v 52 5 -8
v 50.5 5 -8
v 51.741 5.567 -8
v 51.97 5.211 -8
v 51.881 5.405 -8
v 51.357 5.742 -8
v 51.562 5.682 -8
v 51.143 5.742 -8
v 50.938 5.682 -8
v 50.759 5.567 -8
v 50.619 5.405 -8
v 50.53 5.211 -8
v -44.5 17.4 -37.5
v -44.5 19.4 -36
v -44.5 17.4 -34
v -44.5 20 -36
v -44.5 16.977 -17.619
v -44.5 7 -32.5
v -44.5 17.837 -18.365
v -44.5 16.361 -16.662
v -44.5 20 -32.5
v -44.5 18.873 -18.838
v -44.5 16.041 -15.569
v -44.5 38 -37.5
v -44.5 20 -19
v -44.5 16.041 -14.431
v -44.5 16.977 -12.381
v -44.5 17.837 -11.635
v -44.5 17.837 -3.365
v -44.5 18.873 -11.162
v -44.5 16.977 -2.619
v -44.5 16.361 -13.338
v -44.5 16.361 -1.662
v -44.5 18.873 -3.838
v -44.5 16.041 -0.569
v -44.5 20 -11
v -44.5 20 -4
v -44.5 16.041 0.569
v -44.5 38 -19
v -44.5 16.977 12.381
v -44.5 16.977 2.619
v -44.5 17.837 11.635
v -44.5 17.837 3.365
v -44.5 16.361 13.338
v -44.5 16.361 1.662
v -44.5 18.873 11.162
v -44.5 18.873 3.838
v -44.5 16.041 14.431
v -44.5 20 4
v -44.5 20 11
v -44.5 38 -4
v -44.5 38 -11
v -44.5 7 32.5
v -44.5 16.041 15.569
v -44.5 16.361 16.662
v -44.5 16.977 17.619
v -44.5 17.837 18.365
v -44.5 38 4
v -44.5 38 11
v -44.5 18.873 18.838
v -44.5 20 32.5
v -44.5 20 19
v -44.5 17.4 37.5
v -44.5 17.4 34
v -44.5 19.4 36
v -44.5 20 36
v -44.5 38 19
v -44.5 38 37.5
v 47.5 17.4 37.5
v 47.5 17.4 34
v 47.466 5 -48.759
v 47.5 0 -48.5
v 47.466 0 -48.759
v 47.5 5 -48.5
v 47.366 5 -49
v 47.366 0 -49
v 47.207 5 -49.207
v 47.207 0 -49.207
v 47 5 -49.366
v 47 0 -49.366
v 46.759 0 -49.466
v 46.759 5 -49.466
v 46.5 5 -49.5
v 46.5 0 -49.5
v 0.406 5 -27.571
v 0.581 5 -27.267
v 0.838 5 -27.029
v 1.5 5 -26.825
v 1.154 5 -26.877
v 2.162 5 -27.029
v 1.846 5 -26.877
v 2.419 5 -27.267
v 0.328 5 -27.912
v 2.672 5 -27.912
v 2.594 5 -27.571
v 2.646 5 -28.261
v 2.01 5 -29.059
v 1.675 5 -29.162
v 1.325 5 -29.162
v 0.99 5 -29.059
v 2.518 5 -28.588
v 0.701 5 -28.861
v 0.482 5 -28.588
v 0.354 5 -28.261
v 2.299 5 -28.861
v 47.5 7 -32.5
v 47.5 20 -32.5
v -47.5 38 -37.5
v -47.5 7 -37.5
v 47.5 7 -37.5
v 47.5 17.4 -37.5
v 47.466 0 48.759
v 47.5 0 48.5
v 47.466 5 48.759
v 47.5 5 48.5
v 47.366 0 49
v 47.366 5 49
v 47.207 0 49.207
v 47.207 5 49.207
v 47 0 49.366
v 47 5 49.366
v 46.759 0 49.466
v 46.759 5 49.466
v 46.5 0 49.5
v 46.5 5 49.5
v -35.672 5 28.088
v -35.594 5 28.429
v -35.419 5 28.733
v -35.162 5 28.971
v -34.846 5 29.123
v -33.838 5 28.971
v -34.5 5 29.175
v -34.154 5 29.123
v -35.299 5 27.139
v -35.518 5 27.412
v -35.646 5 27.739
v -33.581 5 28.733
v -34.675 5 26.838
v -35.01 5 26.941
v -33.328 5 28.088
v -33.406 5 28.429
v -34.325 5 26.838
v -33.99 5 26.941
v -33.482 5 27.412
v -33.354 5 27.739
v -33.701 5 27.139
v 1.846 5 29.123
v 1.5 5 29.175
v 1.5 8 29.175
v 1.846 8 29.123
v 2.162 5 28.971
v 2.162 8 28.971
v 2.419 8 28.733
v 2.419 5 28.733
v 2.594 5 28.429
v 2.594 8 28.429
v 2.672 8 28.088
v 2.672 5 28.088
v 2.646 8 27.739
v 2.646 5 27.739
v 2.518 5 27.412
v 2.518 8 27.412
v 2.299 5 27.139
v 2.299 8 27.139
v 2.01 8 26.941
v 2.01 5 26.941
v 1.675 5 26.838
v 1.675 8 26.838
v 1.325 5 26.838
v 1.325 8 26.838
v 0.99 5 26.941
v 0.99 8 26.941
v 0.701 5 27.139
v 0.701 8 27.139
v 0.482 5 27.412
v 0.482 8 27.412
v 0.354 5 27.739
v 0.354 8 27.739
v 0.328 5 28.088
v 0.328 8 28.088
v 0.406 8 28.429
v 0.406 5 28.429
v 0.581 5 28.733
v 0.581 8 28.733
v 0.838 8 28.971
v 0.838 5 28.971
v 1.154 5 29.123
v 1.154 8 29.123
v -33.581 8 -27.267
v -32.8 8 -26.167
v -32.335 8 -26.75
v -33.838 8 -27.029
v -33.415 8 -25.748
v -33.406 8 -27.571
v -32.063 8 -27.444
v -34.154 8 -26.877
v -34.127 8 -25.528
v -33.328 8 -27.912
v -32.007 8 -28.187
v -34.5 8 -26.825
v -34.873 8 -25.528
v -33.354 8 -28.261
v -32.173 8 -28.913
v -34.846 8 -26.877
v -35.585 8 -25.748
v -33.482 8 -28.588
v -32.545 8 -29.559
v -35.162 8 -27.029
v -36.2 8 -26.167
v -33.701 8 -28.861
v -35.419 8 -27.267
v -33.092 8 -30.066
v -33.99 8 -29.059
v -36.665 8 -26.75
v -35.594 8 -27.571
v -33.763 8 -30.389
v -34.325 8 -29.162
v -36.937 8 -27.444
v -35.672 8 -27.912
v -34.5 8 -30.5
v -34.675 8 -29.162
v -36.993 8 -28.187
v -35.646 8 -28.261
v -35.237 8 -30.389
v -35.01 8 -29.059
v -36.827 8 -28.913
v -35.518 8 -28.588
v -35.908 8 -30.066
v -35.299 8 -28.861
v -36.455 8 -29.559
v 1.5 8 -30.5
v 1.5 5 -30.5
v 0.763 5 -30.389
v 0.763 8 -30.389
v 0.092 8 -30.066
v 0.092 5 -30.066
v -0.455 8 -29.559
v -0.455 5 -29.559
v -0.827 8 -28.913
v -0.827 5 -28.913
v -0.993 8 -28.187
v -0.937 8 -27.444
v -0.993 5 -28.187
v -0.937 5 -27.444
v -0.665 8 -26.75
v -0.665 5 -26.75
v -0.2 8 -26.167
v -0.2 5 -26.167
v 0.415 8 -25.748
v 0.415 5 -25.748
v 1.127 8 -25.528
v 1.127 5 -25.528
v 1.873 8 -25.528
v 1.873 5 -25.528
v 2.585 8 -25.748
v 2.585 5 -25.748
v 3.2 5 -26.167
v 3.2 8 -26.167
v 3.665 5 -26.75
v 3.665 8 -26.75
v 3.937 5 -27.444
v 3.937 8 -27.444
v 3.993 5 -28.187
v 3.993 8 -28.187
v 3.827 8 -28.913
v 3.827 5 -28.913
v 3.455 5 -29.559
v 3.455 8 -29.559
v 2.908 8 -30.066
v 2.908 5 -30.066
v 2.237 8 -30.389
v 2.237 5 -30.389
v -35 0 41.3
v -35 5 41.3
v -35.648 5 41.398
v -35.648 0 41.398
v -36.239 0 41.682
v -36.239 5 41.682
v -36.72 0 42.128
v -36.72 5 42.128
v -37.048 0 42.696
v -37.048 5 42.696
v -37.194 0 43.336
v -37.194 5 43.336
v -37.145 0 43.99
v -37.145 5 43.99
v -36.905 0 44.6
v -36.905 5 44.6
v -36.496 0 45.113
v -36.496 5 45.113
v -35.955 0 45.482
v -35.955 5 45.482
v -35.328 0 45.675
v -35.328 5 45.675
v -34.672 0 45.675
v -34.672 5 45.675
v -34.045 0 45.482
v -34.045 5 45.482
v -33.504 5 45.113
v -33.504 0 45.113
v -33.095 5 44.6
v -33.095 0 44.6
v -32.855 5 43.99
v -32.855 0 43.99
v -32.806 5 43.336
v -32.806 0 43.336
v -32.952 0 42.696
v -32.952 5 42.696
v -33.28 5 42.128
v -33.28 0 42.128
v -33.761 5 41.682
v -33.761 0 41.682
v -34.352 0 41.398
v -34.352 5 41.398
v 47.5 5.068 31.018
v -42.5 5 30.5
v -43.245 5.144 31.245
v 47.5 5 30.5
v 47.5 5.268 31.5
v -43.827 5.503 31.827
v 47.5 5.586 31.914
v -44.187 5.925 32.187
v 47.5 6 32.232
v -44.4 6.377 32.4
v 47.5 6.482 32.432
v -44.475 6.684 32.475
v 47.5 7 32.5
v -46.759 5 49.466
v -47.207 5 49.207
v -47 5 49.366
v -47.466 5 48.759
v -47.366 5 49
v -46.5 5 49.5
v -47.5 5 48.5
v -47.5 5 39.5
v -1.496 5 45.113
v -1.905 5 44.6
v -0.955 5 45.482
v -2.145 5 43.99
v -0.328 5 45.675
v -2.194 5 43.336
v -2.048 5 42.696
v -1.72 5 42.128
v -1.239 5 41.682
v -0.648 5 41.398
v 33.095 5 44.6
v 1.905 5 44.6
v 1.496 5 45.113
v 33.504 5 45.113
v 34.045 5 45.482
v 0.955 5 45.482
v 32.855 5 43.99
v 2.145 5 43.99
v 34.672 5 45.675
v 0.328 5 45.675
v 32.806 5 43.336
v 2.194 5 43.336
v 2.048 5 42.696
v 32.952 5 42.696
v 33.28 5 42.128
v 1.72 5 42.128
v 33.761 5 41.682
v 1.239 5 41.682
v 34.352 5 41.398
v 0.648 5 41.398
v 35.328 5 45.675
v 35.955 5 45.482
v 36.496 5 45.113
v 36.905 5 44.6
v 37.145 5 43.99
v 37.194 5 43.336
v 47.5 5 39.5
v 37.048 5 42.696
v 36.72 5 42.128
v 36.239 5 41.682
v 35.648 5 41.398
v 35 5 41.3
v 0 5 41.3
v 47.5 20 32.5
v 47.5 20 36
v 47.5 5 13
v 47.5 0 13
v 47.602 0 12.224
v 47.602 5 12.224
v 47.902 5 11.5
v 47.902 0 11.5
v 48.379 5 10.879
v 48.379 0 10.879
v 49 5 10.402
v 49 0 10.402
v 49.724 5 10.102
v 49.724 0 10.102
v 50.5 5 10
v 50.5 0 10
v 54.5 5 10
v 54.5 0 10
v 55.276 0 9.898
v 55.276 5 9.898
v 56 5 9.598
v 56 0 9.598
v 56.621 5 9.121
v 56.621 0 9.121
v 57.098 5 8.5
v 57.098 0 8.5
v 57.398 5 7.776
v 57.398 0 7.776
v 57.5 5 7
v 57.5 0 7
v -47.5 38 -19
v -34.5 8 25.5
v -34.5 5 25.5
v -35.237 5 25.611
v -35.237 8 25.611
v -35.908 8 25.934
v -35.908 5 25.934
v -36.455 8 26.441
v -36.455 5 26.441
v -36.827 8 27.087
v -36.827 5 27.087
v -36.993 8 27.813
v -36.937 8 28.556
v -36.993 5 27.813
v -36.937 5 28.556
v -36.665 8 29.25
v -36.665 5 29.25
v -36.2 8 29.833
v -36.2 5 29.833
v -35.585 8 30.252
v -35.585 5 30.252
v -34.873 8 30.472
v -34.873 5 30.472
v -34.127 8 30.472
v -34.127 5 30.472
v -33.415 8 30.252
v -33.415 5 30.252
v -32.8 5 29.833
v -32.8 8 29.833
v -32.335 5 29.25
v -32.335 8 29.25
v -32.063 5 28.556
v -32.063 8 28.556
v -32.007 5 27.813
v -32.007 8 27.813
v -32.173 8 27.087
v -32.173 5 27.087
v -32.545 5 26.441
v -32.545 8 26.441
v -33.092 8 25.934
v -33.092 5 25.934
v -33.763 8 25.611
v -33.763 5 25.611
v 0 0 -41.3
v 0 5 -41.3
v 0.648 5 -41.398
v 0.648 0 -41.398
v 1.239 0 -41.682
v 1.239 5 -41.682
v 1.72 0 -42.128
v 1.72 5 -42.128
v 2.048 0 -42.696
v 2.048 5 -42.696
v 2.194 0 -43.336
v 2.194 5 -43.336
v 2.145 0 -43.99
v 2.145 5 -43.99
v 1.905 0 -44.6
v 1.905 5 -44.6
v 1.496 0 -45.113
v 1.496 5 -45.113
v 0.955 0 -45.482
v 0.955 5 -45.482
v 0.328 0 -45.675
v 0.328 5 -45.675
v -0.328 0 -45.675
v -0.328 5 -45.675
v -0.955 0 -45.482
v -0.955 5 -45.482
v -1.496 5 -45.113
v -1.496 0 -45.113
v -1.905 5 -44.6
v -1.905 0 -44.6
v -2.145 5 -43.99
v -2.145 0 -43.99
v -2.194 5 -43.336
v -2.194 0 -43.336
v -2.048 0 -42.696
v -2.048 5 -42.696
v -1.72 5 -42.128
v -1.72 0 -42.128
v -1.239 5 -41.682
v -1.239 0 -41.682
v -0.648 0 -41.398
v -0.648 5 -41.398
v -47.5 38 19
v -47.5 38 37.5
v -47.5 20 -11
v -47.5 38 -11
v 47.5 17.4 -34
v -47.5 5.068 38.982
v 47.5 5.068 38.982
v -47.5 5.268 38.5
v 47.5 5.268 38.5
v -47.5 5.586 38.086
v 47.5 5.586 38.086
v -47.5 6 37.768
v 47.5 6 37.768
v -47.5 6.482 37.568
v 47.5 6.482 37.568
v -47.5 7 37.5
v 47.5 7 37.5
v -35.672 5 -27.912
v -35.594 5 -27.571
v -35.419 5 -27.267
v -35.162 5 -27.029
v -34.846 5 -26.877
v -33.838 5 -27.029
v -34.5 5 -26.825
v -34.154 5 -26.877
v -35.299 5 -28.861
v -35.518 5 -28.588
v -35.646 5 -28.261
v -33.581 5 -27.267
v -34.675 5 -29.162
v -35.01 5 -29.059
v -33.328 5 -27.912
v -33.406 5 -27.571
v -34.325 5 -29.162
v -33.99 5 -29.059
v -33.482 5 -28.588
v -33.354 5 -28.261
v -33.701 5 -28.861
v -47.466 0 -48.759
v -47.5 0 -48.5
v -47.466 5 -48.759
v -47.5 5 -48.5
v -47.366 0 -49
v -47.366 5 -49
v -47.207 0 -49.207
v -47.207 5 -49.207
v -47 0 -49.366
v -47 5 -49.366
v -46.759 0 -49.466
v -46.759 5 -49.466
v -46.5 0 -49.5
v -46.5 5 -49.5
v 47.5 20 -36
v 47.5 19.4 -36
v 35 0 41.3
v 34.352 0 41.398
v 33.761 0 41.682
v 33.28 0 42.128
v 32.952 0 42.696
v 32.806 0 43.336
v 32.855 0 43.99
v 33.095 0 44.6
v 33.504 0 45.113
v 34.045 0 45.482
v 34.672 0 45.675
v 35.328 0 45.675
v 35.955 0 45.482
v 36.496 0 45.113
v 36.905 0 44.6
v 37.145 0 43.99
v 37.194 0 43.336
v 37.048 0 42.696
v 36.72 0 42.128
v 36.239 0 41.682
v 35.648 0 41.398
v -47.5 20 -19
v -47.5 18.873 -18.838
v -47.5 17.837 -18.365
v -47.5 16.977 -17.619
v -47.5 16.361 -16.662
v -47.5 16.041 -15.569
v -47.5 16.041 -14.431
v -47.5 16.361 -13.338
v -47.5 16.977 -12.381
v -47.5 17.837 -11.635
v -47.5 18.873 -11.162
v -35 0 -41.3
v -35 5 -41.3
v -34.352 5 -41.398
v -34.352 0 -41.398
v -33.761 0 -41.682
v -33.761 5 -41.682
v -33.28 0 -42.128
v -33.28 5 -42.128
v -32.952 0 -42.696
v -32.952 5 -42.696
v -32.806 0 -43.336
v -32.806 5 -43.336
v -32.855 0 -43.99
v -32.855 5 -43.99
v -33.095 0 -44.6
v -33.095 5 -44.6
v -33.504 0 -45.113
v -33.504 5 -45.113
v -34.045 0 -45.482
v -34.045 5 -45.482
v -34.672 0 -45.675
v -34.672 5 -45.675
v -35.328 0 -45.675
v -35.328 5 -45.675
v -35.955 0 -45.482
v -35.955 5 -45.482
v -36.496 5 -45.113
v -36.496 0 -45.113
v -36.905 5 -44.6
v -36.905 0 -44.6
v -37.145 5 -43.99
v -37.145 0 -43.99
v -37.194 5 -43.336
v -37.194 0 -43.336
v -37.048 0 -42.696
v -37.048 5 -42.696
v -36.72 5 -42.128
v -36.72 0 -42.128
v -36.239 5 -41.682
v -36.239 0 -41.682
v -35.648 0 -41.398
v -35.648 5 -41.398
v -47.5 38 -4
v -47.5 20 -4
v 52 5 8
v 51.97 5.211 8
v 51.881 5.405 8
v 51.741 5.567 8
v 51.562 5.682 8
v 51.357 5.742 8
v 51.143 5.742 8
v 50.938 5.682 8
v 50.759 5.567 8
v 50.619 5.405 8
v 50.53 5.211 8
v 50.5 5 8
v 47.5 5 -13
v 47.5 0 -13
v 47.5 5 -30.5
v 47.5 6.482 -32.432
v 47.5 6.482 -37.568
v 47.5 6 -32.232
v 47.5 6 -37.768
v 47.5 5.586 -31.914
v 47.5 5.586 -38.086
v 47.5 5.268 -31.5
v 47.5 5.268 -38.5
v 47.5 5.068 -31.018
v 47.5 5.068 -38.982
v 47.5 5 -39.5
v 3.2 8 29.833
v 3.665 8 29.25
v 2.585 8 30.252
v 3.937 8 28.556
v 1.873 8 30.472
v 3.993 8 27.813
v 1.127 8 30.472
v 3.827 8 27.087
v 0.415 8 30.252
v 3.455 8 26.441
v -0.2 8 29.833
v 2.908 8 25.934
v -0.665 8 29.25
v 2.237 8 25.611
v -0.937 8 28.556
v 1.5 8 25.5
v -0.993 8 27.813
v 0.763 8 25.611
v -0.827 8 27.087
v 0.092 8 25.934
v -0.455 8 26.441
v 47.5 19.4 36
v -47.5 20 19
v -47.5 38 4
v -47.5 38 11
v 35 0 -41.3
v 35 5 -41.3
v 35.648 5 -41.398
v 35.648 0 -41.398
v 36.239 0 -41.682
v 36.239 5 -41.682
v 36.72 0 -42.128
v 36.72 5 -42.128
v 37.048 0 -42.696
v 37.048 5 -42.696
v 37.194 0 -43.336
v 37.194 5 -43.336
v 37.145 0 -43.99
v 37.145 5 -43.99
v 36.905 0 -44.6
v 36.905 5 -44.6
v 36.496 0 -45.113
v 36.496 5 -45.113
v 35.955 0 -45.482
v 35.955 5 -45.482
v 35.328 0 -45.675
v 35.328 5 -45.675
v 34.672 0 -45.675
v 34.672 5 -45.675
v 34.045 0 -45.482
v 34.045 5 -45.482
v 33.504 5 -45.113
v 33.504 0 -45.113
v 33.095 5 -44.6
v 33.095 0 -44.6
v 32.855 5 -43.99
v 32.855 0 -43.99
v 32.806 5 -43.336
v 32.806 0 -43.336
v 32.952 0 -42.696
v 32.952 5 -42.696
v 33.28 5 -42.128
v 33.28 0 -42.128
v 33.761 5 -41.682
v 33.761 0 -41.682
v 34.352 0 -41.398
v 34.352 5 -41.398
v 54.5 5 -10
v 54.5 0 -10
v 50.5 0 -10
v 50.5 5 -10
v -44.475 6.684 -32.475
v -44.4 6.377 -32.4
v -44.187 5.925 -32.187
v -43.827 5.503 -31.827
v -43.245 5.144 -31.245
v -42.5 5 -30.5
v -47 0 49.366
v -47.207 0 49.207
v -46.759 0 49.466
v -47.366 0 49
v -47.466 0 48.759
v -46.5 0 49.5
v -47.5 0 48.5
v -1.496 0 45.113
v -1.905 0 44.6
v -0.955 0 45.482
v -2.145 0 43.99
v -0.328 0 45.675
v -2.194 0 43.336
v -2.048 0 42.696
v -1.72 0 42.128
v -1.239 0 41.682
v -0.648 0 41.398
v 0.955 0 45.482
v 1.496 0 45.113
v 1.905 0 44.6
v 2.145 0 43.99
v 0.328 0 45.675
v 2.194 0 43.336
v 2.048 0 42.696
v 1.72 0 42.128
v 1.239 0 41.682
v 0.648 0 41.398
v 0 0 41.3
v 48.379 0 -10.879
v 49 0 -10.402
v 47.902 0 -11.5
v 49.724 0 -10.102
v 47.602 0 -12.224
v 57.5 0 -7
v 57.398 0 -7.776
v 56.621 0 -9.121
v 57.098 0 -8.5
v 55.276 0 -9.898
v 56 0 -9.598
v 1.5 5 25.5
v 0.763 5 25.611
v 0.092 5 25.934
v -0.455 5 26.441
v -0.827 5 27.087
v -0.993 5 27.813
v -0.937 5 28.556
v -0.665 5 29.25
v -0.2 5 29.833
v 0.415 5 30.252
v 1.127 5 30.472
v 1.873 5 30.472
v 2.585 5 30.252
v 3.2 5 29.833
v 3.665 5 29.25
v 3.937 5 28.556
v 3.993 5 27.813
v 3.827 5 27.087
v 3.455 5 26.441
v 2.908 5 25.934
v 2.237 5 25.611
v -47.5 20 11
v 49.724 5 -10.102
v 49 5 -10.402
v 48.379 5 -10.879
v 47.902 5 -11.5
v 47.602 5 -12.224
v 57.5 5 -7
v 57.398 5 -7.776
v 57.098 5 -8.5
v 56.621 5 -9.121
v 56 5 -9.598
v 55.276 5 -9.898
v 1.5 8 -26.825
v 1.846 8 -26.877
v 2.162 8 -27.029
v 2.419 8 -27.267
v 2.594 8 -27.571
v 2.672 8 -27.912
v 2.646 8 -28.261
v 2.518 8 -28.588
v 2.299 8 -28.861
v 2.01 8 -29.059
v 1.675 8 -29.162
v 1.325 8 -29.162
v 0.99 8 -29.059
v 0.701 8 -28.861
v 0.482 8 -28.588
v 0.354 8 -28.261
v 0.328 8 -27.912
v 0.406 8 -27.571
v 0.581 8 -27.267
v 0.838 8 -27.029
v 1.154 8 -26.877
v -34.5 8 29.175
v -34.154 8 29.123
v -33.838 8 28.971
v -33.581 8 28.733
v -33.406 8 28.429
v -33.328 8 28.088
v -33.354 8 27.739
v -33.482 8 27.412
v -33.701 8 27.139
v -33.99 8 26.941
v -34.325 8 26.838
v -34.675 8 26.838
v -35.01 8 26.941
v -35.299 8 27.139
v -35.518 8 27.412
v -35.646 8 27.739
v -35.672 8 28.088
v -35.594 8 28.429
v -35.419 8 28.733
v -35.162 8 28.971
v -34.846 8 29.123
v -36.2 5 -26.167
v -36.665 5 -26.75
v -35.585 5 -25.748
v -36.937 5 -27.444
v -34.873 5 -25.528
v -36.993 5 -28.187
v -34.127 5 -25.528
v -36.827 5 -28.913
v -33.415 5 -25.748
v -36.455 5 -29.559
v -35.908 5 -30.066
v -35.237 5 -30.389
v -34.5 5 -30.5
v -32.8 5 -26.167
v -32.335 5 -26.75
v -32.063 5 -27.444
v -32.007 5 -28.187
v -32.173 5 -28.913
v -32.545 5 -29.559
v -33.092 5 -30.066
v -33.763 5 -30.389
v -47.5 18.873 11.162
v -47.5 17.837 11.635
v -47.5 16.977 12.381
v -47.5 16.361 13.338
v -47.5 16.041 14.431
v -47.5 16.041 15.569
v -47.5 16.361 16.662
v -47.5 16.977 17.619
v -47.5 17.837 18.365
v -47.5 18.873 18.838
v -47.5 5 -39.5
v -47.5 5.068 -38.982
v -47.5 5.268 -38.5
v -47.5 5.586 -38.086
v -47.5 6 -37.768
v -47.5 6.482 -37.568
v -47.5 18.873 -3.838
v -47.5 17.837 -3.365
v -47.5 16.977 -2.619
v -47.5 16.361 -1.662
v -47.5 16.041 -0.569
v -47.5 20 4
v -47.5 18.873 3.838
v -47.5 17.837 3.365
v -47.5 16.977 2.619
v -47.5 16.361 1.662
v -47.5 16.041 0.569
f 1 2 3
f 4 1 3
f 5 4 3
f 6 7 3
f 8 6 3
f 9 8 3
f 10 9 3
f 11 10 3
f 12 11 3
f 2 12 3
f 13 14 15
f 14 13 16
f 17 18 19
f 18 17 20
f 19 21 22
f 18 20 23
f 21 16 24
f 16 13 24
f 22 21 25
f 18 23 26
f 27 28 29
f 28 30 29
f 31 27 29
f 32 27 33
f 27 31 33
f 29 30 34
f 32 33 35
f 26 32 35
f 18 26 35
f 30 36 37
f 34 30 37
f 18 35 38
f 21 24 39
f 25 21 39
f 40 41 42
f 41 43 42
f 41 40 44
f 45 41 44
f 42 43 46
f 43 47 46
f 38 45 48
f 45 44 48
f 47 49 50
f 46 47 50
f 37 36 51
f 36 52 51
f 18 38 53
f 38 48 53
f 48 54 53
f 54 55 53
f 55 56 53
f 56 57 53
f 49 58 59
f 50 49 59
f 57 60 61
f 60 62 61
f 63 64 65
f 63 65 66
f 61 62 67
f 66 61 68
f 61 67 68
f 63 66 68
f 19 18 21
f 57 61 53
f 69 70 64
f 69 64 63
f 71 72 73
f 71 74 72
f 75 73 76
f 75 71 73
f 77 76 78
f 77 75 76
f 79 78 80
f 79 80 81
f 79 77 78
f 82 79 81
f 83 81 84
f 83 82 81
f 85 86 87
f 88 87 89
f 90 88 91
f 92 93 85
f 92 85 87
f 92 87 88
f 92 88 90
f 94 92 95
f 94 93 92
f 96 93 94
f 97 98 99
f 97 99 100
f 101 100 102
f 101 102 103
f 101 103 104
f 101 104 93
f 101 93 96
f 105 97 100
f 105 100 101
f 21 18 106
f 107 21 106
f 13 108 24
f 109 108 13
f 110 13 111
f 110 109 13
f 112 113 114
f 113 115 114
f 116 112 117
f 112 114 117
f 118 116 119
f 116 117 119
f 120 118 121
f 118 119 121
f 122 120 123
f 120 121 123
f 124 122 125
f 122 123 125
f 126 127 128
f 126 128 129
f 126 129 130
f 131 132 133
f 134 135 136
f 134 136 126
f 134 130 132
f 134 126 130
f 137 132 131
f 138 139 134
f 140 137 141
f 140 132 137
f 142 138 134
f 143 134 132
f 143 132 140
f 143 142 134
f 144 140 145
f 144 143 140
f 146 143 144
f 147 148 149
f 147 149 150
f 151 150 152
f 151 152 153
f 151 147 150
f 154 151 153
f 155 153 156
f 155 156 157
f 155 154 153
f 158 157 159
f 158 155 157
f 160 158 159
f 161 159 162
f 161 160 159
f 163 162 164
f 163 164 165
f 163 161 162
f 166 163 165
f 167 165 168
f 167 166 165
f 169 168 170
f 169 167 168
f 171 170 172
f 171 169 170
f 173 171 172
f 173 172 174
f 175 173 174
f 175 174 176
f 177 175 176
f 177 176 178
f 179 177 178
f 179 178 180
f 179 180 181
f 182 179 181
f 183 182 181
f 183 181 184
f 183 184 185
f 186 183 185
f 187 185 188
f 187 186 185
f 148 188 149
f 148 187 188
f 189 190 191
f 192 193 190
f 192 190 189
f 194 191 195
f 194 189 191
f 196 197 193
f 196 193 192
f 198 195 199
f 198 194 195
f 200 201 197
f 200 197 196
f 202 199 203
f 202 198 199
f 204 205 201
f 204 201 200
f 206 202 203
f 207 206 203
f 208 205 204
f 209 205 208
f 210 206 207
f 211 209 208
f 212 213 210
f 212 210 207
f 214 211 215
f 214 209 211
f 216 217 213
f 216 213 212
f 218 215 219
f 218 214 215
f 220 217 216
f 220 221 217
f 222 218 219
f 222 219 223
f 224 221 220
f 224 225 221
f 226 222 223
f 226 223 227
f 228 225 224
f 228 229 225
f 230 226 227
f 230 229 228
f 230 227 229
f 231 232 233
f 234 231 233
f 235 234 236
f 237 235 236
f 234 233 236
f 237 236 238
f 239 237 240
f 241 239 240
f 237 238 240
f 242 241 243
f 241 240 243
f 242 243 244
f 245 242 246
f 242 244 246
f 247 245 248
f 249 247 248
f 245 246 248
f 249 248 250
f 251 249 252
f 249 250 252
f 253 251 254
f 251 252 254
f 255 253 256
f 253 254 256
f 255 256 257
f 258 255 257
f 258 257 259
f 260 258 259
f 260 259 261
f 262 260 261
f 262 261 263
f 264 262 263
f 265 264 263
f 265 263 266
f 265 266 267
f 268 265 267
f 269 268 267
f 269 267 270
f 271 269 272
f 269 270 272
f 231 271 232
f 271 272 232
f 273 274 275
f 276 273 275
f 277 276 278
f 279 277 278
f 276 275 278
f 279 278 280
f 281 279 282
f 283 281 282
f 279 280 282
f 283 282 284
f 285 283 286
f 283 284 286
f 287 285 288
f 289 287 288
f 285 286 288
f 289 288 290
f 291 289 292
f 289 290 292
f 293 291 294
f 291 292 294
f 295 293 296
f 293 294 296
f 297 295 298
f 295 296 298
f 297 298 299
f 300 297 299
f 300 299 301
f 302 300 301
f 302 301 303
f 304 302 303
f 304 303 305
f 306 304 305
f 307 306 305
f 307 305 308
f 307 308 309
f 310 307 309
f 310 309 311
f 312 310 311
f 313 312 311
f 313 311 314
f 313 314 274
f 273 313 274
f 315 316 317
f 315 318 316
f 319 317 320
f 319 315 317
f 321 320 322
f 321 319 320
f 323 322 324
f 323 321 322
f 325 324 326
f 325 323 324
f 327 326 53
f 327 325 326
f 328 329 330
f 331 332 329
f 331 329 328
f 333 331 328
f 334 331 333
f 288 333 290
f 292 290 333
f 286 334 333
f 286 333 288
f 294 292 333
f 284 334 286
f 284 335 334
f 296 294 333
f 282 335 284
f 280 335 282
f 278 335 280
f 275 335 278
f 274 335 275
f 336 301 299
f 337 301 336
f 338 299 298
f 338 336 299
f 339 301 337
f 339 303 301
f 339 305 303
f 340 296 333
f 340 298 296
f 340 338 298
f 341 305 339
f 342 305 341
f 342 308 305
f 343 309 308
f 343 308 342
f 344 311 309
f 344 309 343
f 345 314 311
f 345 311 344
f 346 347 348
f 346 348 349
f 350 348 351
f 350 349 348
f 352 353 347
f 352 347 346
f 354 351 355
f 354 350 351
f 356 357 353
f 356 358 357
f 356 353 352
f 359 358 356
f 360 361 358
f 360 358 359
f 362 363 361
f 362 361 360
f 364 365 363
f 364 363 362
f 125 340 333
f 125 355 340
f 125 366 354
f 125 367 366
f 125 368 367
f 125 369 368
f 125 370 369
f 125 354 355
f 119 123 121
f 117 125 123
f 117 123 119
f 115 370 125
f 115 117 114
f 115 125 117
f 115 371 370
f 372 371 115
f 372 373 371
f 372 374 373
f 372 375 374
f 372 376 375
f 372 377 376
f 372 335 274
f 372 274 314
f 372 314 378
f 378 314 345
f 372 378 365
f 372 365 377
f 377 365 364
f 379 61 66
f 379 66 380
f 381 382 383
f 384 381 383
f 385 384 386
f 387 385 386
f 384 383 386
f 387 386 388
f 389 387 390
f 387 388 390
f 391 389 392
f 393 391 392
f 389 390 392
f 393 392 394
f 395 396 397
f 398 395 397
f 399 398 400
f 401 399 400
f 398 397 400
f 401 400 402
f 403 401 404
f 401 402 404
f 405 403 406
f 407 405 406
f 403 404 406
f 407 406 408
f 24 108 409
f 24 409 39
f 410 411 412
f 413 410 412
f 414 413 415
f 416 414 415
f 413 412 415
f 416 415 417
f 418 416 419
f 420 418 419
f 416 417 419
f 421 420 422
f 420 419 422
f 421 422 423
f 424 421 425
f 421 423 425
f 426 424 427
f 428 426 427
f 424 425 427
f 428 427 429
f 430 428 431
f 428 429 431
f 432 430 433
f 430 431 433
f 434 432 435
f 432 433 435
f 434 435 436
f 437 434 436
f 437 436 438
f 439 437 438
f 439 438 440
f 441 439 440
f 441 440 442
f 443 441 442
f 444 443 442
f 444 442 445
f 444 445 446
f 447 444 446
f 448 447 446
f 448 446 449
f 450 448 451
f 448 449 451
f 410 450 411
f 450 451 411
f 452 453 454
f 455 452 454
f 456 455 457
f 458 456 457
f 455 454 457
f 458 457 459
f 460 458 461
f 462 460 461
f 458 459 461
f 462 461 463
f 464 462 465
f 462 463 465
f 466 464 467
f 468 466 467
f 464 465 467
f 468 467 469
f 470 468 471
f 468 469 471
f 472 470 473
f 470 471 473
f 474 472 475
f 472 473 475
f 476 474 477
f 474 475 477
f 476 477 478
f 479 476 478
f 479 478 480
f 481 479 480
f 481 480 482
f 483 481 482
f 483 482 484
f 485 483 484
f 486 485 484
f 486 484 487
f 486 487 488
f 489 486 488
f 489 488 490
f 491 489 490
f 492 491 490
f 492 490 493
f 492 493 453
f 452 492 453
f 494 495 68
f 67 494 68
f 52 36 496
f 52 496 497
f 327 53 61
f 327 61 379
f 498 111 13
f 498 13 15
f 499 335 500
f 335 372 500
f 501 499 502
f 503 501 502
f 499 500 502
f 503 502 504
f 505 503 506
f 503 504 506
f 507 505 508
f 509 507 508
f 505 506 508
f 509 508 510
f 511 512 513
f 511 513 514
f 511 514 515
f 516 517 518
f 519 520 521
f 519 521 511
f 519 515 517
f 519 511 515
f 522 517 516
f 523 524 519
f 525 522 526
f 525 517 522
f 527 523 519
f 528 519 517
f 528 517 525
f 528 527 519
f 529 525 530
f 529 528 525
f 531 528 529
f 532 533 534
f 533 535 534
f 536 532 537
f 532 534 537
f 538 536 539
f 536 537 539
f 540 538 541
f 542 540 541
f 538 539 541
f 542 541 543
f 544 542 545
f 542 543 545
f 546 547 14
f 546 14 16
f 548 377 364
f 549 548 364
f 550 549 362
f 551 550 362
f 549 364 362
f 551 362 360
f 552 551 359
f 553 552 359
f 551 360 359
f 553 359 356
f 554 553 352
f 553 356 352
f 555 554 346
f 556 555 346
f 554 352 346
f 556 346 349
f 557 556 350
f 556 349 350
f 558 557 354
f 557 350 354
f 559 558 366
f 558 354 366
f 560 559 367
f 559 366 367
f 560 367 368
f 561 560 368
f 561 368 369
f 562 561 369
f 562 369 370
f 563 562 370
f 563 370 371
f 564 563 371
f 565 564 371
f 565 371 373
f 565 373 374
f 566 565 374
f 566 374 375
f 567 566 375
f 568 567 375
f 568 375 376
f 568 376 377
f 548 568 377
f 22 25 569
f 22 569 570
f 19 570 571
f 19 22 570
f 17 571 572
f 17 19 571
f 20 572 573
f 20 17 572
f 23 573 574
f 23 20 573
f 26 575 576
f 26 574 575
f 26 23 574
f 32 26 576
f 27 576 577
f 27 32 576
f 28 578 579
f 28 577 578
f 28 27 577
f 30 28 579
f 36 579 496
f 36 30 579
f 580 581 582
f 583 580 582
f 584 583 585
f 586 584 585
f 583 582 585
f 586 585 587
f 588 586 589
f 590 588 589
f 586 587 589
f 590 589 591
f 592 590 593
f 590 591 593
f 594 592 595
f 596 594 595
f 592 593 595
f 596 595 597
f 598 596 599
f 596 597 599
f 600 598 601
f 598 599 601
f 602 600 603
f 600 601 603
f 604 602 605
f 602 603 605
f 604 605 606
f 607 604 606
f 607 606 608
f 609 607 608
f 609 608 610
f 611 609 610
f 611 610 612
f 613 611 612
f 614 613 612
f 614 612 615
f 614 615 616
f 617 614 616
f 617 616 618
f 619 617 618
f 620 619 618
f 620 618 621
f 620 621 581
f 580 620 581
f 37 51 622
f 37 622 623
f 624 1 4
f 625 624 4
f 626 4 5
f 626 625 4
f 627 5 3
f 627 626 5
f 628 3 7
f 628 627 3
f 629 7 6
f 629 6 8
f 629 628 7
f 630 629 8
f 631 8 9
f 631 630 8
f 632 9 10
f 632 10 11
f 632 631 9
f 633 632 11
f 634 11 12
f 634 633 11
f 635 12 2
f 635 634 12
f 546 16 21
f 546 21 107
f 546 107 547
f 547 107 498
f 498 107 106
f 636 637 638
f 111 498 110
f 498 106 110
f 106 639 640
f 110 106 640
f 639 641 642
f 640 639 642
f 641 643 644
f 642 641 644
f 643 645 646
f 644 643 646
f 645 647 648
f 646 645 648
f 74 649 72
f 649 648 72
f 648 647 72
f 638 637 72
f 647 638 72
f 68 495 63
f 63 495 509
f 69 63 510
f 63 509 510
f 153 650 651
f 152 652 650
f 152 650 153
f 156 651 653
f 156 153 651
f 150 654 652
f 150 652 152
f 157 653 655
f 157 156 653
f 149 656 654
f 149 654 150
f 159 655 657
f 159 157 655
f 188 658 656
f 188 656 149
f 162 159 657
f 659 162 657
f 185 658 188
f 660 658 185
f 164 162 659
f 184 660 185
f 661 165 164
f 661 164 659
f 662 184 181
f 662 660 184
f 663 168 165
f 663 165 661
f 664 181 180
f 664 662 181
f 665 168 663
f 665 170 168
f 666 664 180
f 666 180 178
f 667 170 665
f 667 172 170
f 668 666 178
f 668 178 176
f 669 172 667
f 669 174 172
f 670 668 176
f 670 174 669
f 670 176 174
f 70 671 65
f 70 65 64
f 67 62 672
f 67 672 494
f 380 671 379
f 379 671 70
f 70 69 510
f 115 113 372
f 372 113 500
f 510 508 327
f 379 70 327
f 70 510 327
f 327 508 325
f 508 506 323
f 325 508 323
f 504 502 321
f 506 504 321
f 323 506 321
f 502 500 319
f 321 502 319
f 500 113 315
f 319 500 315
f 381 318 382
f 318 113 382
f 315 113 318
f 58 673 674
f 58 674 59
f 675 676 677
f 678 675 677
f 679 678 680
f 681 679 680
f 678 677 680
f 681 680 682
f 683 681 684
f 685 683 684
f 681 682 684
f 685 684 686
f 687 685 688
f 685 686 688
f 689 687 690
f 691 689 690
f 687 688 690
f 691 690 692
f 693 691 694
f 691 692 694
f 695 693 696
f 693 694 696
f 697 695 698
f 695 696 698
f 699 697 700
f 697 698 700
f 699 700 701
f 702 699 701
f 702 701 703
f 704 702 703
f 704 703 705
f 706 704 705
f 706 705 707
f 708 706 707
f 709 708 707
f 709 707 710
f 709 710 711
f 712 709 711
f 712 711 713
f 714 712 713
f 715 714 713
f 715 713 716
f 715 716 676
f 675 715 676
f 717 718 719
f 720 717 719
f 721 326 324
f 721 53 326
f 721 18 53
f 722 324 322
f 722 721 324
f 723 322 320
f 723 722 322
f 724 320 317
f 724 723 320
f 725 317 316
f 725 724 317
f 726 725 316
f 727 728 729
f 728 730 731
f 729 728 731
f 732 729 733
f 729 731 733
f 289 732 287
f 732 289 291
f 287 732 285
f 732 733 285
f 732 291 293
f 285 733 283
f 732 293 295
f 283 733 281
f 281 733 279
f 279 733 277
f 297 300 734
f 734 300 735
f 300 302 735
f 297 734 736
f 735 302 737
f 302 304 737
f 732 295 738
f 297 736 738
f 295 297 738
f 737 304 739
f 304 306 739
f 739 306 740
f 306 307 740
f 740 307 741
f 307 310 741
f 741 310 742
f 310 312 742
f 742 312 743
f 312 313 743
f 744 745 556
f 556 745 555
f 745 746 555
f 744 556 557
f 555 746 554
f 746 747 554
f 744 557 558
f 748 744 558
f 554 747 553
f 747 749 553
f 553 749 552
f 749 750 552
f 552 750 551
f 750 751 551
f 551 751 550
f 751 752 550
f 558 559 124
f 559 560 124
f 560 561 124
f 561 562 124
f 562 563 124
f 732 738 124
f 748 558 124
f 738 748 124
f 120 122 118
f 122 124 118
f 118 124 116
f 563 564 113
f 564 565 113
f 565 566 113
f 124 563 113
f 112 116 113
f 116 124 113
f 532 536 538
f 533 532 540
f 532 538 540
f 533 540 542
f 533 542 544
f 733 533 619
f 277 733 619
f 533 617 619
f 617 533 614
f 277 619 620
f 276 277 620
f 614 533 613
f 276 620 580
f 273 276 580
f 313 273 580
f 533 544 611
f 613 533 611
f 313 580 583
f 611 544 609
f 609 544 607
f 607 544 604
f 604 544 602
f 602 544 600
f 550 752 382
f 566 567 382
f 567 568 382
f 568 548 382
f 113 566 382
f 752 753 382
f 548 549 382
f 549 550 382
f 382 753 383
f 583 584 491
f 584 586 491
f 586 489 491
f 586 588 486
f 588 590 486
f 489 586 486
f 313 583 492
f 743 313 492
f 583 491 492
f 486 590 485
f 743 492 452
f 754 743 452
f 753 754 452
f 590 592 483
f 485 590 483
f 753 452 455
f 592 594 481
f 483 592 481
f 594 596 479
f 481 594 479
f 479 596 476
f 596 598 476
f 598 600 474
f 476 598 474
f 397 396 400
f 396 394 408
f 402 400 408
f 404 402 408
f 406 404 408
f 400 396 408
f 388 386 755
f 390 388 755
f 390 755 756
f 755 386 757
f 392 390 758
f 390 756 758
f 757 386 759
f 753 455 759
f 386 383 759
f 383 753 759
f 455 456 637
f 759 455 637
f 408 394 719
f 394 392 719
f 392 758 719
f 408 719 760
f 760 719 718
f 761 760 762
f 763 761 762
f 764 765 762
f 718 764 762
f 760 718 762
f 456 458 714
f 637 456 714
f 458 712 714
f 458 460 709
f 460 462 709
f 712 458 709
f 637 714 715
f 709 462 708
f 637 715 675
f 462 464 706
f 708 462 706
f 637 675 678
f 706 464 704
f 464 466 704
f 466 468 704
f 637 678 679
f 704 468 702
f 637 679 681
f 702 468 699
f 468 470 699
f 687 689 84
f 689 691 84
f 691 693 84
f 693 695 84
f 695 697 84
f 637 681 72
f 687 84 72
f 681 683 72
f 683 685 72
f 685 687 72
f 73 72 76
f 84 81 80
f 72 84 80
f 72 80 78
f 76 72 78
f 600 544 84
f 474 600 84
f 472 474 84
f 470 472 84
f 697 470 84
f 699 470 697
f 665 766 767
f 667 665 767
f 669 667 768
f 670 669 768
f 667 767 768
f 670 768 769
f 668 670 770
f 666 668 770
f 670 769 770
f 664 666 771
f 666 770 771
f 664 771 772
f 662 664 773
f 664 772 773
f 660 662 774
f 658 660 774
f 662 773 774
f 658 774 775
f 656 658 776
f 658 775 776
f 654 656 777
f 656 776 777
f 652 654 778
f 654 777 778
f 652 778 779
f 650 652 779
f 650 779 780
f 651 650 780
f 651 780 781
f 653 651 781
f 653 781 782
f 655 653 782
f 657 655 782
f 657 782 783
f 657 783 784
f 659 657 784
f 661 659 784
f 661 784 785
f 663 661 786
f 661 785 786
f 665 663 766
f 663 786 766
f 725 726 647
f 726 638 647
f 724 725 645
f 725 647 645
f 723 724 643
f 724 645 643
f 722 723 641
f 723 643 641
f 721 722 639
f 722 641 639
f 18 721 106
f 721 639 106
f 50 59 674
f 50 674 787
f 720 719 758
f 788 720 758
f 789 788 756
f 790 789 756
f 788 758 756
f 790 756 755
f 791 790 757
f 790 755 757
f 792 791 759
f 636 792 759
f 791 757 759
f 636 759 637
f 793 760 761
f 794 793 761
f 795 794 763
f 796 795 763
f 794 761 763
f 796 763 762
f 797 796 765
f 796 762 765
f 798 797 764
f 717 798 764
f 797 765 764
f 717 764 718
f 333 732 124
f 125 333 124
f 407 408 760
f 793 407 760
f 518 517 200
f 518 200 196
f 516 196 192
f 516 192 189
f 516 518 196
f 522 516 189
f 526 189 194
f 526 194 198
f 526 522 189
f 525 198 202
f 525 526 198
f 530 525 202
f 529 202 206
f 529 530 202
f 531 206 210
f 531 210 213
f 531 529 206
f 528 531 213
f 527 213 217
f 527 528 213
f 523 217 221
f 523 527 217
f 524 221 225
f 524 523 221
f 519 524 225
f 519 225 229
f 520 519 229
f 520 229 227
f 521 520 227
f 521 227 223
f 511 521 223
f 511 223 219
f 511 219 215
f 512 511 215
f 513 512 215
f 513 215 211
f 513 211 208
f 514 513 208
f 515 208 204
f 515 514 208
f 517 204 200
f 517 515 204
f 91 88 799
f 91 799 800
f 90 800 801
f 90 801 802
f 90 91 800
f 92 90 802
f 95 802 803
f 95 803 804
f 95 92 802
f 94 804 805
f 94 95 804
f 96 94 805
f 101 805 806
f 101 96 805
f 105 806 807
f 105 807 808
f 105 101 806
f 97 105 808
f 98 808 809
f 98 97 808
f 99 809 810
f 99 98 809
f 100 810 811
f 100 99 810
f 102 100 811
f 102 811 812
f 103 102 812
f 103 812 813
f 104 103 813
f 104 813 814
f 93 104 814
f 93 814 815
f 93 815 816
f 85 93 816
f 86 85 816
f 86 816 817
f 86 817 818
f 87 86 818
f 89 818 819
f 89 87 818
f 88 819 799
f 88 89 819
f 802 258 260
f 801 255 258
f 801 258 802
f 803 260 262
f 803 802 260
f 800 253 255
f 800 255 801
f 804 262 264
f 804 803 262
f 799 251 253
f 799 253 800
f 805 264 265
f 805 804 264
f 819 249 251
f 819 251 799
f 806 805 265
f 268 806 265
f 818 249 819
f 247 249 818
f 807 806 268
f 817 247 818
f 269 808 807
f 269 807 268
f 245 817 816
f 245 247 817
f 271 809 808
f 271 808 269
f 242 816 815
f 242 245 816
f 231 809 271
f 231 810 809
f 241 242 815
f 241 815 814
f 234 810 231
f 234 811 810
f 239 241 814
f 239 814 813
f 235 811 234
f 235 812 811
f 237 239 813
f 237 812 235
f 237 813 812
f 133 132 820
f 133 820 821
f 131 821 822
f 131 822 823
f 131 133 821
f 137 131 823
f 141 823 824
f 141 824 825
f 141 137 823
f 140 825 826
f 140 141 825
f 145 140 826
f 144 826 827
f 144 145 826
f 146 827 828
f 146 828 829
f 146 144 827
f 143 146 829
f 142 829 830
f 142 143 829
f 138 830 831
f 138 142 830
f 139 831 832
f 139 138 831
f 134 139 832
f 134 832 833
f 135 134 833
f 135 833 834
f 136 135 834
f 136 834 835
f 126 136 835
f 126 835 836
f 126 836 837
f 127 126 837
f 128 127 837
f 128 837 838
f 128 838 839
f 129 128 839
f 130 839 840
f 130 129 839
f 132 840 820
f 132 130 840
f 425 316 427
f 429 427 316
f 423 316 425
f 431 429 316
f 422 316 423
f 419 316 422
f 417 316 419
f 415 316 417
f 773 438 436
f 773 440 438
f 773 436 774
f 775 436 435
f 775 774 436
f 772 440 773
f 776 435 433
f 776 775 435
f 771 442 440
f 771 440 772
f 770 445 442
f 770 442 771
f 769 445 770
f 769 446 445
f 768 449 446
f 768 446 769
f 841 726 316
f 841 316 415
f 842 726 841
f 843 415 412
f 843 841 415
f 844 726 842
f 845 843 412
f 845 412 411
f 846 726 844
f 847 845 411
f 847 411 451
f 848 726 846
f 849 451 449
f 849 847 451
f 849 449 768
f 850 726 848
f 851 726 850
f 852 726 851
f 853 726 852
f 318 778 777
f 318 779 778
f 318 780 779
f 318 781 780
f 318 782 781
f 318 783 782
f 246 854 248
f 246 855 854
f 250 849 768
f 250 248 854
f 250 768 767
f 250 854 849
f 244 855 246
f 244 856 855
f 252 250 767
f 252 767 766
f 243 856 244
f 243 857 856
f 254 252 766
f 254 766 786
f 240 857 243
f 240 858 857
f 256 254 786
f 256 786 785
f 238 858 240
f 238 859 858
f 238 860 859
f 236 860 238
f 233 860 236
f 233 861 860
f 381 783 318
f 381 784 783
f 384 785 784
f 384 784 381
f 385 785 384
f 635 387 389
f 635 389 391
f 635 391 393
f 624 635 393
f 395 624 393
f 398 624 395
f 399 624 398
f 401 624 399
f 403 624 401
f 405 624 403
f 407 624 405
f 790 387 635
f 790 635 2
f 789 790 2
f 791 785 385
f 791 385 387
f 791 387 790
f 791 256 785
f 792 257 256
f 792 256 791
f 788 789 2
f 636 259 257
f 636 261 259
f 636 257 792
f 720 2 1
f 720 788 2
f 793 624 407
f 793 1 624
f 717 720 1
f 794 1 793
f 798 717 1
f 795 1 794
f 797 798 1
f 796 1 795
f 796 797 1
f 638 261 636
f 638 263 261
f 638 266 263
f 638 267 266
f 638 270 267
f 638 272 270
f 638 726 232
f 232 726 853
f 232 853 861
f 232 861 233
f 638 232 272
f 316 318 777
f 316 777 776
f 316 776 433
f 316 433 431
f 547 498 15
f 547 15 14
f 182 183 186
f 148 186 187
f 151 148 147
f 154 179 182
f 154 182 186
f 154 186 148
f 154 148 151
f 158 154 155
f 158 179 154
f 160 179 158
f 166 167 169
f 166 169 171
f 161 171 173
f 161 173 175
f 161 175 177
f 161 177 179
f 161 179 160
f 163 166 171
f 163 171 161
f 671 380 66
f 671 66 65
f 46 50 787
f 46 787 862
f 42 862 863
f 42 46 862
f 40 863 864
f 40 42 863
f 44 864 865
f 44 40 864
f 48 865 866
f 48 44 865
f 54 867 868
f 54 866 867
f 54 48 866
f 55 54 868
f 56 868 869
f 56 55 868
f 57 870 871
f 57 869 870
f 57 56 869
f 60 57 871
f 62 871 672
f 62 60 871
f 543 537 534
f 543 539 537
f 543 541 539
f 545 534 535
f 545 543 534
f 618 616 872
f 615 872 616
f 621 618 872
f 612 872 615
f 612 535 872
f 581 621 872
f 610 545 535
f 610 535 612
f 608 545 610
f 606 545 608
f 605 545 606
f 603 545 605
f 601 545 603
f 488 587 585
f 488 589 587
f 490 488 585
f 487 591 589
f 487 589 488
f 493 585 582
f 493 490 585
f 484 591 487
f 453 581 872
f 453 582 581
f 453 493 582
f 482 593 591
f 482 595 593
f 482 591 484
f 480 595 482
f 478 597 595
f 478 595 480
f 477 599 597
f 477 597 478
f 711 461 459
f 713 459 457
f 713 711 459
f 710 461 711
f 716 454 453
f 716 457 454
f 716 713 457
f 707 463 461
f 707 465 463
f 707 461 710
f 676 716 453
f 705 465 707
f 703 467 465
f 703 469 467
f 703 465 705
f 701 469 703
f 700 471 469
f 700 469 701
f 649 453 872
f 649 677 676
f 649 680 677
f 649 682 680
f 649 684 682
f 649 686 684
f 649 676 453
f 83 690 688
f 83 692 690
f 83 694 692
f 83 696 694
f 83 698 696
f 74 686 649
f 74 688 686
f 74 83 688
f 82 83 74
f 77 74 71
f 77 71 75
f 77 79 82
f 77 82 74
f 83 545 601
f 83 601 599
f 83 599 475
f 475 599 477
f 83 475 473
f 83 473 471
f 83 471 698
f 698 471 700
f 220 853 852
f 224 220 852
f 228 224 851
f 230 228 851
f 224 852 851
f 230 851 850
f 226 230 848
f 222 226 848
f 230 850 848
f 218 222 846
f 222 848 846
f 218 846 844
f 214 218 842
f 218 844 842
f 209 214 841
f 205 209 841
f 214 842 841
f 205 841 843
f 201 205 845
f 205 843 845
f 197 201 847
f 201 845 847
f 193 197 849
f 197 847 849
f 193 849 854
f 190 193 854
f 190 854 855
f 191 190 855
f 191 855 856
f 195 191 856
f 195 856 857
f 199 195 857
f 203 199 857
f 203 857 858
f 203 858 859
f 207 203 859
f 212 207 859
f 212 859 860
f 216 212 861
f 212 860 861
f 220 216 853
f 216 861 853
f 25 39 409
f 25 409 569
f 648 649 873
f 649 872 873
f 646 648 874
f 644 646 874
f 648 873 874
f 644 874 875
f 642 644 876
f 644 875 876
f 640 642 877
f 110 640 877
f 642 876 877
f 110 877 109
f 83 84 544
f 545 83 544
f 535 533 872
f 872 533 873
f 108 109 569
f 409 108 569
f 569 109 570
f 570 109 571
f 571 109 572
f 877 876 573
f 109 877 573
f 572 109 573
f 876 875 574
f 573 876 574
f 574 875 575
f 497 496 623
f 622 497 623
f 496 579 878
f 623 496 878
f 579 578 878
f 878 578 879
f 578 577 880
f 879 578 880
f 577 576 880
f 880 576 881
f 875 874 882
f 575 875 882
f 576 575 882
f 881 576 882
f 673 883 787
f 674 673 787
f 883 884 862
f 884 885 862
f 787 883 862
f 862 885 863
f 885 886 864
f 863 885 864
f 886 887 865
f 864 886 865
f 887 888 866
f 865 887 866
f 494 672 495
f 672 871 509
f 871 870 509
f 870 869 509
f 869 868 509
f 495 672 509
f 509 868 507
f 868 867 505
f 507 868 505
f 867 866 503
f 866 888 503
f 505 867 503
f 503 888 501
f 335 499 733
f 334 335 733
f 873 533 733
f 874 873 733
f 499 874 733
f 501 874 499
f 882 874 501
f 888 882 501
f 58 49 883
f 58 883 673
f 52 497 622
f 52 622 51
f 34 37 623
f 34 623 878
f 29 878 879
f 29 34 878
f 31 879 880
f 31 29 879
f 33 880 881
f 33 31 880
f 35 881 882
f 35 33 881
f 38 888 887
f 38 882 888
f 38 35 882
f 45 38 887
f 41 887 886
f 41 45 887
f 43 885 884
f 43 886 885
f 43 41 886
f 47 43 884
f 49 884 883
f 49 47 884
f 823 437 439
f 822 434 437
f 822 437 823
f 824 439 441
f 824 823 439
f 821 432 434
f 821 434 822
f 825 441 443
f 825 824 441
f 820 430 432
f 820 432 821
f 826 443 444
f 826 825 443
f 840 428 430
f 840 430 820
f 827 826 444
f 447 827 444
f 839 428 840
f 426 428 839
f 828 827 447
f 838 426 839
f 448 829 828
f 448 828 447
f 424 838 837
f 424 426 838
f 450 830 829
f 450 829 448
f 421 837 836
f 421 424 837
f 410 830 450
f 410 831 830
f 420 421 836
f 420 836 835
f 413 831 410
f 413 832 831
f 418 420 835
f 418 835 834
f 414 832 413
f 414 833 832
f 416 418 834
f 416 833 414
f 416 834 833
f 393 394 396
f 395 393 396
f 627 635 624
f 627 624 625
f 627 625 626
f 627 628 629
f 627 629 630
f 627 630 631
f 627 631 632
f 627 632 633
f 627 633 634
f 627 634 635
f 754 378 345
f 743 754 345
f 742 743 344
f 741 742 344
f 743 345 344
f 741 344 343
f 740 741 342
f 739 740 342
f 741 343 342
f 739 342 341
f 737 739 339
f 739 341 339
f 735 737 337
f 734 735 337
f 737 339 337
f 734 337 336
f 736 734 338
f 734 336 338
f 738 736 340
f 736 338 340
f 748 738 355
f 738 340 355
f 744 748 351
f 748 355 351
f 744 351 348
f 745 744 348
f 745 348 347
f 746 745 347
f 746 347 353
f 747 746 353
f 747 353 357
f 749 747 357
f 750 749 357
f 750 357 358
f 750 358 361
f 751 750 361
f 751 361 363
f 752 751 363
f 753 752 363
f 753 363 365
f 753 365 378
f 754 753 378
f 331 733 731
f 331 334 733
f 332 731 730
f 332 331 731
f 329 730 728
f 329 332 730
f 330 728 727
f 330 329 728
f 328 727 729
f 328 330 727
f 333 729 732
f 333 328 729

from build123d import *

# Parameters (mm, degrees)
BOSS_EXTRUDE1_DEPTH = 5
SKETCH2_W           = 95
SKETCH2_H           = 5
BOSS_EXTRUDE2_DEPTH = 15
SKETCH3_W           = 3
SKETCH3_H           = 75
BOSS_EXTRUDE3_DEPTH = 33
SKETCH4_R           = 2.5
SKETCH4_R_2         = 1.175
BOSS_EXTRUDE4_DEPTH = 3
CUT_EXTRUDE1_DEPTH  = 120.57529009
SKETCH6_R           = 2.2
CUT_EXTRUDE2_DEPTH  = 83.737536826
CUT_EXTRUDE3_DEPTH  = 92
FILLET1_R           = 1
FILLET2_R           = 2
BOSS_EXTRUDE5_START = -2
BOSS_EXTRUDE5_DEPTH = 16


with BuildPart() as part:
    # Sketch1 → Boss-Extrude1 (new body)
    with BuildSketch(Plane(origin=(0, 0, 0), x_dir=(1, 0, 0), z_dir=(0, 1, 0))):
        with BuildLine():
            Line((47.5, 13), (47.5, 49.5))
            Line((47.5, 49.5), (-47.5, 49.5))
            Line((-47.5, 49.5), (-47.5, -49.5))
            Line((-47.5, -49.5), (47.5, -49.5))
            Line((47.5, -49.5), (47.5, -13))
            ThreePointArc((47.5, -13), (48.378679656, -10.878679656), (50.5, -10))
            Line((50.5, -10), (54.5, -10))
            ThreePointArc((54.5, -10), (56.621320344, -9.121320344), (57.5, -7))
            Line((57.5, -7), (57.5, 7))
            ThreePointArc((57.5, 7), (56.621320344, 9.121320344), (54.5, 10))
            Line((54.5, 10), (50.5, 10))
            ThreePointArc((50.5, 10), (48.378679656, 10.878679656), (47.5, 13))
        make_face()
    extrude(amount=BOSS_EXTRUDE1_DEPTH)

    # Sketch2 → Boss-Extrude2 (add)
    with BuildSketch(Plane(origin=(0, 5, 0), x_dir=(1, 0, 0), z_dir=(0, 1, 0))):
        with Locations((0, 35)):
            Rectangle(SKETCH2_W, SKETCH2_H)
        with Locations((0, -35)):
            Rectangle(SKETCH2_W, SKETCH2_H)
    extrude(amount=BOSS_EXTRUDE2_DEPTH)

    # Sketch3 → Boss-Extrude3 (add)
    with BuildSketch(Plane(origin=(0, 5, 0), x_dir=(1, 0, 0), z_dir=(0, 1, 0))):
        with Locations((-46, 0)):
            Rectangle(SKETCH3_W, SKETCH3_H)
    extrude(amount=BOSS_EXTRUDE3_DEPTH)

    # Sketch4 → Boss-Extrude4 (add)
    # profile 1 of 4: a face of its own
    with BuildSketch(Plane(origin=(0, 5, 0), x_dir=(1, 0, 0), z_dir=(0, 1, 0))):
        with Locations(Location((-34.5, 28, 0), (0, 0, 90))):
            Circle(SKETCH4_R)
        with Locations(Location((-34.5, 28, 0), (0, 0, 270))):
            Circle(SKETCH4_R_2, mode=Mode.SUBTRACT)
    # profile 2 of 4: a face of its own
    with BuildSketch(Plane(origin=(0, 5, 0), x_dir=(1, 0, 0), z_dir=(0, 1, 0))):
        with Locations(Location((-34.5, -28, 0), (0, 0, 90))):
            Circle(SKETCH4_R)
        with Locations(Location((-34.5, -28, 0), (0, 0, 270))):
            Circle(SKETCH4_R_2, mode=Mode.SUBTRACT)
    # profile 3 of 4: a face of its own
    with BuildSketch(Plane(origin=(0, 5, 0), x_dir=(1, 0, 0), z_dir=(0, 1, 0))):
        with Locations(Location((1.5, 28, 0), (0, 0, 90))):
            Circle(SKETCH4_R)
        with Locations(Location((1.5, 28, 0), (0, 0, 270))):
            Circle(SKETCH4_R_2, mode=Mode.SUBTRACT)
    # profile 4 of 4: a face of its own
    with BuildSketch(Plane(origin=(0, 5, 0), x_dir=(1, 0, 0), z_dir=(0, 1, 0))):
        with Locations(Location((1.5, -28, 0), (0, 0, 90))):
            Circle(SKETCH4_R)
        with Locations(Location((1.5, -28, 0), (0, 0, 270))):
            Circle(SKETCH4_R_2, mode=Mode.SUBTRACT)
    extrude(amount=BOSS_EXTRUDE4_DEPTH)

    # Sketch5 → Cut-Extrude1 (cut, through all)
    with BuildSketch(Plane(origin=(-44.5, 0, 0), x_dir=(0, 0, -1), z_dir=(1, 0, 0))):
        with BuildLine():
            Line((-19, 20), (-19, 38))
            Line((-19, 38), (-11, 38))
            Line((-11, 38), (-11, 20))
            ThreePointArc((-11, 20), (-15, 16), (-19, 20))
        make_face()
        with BuildLine():
            Line((-4, 20), (-4, 38))
            Line((-4, 38), (4, 38))
            Line((4, 38), (4, 20))
            ThreePointArc((4, 20), (0, 16), (-4, 20))
        make_face()
        with BuildLine():
            Line((11, 20), (11, 38))
            Line((11, 38), (19, 38))
            Line((19, 38), (19, 20))
            ThreePointArc((19, 20), (15, 16), (11, 20))
        make_face()
    extrude(amount=-CUT_EXTRUDE1_DEPTH, mode=Mode.SUBTRACT)

    # Sketch6 → Cut-Extrude2 (cut, through all)
    with BuildSketch(Plane(origin=(0, 5, 0), x_dir=(1, 0, 0), z_dir=(0, 1, 0))):
        with Locations(Location((-35, 43.5, 0), (0, 0, 270))):
            Circle(SKETCH6_R)
        with Locations(Location((0, 43.5, 0), (0, 0, 270))):
            Circle(SKETCH6_R)
        with Locations(Location((35, 43.5, 0), (0, 0, 270))):
            Circle(SKETCH6_R)
        with Locations(Location((35, -43.5, 0), (0, 0, 90))):
            Circle(SKETCH6_R)
        with Locations(Location((0, -43.5, 0), (0, 0, 90))):
            Circle(SKETCH6_R)
        with Locations(Location((-35, -43.5, 0), (0, 0, 90))):
            Circle(SKETCH6_R)
    extrude(amount=-CUT_EXTRUDE2_DEPTH, mode=Mode.SUBTRACT)

    # Sketch7 → Cut-Extrude3 (cut)
    with BuildSketch(Plane(origin=(47.5, 0, 0), x_dir=(0, 0, -1), z_dir=(1, 0, 0))):
        Polygon((-36, 19.4), (-34, 17.4), (-37.5, 17.4), (-37.5, 20), (-36, 20), align=None)
        Polygon((37.5, 20), (37.5, 17.4), (34, 17.4), (36, 19.4), (36, 20), align=None)
    extrude(amount=-CUT_EXTRUDE3_DEPTH, mode=Mode.SUBTRACT)

    # Fillet1
    fillet1_edges = [part.edges().sort_by_distance(p)[0] for p in [
        (47.5, 2.5, -49.5),
        (47.5, 2.5, 49.5),
        (-47.5, 2.5, 49.5),
        (-47.5, 2.5, -49.5),
    ]]
    fillet(fillet1_edges, radius=FILLET1_R)

    # Fillet2
    fillet2_edges = [part.edges().sort_by_distance(p)[0] for p in [
        (0, 5, -37.5),
        (1.5, 5, 32.5),
        (0, 5, 37.5),
        (1.5, 5, -32.5),
        (-44.5, 5, 0),
    ]]
    fillet(fillet2_edges, radius=FILLET2_R - 0.0001)  # a hair under: the kernel refuses the full size

    # Sketch9 → Boss-Extrude5 (add)
    with BuildSketch(Plane.XY.offset(10).offset(BOSS_EXTRUDE5_START)):
        with BuildLine():
            Line((50.5, 5), (52, 5))
            ThreePointArc((52, 5), (51.25, 5.75), (50.5, 5))
        make_face()
    extrude(amount=-BOSS_EXTRUDE5_DEPTH)


solid = part.part
